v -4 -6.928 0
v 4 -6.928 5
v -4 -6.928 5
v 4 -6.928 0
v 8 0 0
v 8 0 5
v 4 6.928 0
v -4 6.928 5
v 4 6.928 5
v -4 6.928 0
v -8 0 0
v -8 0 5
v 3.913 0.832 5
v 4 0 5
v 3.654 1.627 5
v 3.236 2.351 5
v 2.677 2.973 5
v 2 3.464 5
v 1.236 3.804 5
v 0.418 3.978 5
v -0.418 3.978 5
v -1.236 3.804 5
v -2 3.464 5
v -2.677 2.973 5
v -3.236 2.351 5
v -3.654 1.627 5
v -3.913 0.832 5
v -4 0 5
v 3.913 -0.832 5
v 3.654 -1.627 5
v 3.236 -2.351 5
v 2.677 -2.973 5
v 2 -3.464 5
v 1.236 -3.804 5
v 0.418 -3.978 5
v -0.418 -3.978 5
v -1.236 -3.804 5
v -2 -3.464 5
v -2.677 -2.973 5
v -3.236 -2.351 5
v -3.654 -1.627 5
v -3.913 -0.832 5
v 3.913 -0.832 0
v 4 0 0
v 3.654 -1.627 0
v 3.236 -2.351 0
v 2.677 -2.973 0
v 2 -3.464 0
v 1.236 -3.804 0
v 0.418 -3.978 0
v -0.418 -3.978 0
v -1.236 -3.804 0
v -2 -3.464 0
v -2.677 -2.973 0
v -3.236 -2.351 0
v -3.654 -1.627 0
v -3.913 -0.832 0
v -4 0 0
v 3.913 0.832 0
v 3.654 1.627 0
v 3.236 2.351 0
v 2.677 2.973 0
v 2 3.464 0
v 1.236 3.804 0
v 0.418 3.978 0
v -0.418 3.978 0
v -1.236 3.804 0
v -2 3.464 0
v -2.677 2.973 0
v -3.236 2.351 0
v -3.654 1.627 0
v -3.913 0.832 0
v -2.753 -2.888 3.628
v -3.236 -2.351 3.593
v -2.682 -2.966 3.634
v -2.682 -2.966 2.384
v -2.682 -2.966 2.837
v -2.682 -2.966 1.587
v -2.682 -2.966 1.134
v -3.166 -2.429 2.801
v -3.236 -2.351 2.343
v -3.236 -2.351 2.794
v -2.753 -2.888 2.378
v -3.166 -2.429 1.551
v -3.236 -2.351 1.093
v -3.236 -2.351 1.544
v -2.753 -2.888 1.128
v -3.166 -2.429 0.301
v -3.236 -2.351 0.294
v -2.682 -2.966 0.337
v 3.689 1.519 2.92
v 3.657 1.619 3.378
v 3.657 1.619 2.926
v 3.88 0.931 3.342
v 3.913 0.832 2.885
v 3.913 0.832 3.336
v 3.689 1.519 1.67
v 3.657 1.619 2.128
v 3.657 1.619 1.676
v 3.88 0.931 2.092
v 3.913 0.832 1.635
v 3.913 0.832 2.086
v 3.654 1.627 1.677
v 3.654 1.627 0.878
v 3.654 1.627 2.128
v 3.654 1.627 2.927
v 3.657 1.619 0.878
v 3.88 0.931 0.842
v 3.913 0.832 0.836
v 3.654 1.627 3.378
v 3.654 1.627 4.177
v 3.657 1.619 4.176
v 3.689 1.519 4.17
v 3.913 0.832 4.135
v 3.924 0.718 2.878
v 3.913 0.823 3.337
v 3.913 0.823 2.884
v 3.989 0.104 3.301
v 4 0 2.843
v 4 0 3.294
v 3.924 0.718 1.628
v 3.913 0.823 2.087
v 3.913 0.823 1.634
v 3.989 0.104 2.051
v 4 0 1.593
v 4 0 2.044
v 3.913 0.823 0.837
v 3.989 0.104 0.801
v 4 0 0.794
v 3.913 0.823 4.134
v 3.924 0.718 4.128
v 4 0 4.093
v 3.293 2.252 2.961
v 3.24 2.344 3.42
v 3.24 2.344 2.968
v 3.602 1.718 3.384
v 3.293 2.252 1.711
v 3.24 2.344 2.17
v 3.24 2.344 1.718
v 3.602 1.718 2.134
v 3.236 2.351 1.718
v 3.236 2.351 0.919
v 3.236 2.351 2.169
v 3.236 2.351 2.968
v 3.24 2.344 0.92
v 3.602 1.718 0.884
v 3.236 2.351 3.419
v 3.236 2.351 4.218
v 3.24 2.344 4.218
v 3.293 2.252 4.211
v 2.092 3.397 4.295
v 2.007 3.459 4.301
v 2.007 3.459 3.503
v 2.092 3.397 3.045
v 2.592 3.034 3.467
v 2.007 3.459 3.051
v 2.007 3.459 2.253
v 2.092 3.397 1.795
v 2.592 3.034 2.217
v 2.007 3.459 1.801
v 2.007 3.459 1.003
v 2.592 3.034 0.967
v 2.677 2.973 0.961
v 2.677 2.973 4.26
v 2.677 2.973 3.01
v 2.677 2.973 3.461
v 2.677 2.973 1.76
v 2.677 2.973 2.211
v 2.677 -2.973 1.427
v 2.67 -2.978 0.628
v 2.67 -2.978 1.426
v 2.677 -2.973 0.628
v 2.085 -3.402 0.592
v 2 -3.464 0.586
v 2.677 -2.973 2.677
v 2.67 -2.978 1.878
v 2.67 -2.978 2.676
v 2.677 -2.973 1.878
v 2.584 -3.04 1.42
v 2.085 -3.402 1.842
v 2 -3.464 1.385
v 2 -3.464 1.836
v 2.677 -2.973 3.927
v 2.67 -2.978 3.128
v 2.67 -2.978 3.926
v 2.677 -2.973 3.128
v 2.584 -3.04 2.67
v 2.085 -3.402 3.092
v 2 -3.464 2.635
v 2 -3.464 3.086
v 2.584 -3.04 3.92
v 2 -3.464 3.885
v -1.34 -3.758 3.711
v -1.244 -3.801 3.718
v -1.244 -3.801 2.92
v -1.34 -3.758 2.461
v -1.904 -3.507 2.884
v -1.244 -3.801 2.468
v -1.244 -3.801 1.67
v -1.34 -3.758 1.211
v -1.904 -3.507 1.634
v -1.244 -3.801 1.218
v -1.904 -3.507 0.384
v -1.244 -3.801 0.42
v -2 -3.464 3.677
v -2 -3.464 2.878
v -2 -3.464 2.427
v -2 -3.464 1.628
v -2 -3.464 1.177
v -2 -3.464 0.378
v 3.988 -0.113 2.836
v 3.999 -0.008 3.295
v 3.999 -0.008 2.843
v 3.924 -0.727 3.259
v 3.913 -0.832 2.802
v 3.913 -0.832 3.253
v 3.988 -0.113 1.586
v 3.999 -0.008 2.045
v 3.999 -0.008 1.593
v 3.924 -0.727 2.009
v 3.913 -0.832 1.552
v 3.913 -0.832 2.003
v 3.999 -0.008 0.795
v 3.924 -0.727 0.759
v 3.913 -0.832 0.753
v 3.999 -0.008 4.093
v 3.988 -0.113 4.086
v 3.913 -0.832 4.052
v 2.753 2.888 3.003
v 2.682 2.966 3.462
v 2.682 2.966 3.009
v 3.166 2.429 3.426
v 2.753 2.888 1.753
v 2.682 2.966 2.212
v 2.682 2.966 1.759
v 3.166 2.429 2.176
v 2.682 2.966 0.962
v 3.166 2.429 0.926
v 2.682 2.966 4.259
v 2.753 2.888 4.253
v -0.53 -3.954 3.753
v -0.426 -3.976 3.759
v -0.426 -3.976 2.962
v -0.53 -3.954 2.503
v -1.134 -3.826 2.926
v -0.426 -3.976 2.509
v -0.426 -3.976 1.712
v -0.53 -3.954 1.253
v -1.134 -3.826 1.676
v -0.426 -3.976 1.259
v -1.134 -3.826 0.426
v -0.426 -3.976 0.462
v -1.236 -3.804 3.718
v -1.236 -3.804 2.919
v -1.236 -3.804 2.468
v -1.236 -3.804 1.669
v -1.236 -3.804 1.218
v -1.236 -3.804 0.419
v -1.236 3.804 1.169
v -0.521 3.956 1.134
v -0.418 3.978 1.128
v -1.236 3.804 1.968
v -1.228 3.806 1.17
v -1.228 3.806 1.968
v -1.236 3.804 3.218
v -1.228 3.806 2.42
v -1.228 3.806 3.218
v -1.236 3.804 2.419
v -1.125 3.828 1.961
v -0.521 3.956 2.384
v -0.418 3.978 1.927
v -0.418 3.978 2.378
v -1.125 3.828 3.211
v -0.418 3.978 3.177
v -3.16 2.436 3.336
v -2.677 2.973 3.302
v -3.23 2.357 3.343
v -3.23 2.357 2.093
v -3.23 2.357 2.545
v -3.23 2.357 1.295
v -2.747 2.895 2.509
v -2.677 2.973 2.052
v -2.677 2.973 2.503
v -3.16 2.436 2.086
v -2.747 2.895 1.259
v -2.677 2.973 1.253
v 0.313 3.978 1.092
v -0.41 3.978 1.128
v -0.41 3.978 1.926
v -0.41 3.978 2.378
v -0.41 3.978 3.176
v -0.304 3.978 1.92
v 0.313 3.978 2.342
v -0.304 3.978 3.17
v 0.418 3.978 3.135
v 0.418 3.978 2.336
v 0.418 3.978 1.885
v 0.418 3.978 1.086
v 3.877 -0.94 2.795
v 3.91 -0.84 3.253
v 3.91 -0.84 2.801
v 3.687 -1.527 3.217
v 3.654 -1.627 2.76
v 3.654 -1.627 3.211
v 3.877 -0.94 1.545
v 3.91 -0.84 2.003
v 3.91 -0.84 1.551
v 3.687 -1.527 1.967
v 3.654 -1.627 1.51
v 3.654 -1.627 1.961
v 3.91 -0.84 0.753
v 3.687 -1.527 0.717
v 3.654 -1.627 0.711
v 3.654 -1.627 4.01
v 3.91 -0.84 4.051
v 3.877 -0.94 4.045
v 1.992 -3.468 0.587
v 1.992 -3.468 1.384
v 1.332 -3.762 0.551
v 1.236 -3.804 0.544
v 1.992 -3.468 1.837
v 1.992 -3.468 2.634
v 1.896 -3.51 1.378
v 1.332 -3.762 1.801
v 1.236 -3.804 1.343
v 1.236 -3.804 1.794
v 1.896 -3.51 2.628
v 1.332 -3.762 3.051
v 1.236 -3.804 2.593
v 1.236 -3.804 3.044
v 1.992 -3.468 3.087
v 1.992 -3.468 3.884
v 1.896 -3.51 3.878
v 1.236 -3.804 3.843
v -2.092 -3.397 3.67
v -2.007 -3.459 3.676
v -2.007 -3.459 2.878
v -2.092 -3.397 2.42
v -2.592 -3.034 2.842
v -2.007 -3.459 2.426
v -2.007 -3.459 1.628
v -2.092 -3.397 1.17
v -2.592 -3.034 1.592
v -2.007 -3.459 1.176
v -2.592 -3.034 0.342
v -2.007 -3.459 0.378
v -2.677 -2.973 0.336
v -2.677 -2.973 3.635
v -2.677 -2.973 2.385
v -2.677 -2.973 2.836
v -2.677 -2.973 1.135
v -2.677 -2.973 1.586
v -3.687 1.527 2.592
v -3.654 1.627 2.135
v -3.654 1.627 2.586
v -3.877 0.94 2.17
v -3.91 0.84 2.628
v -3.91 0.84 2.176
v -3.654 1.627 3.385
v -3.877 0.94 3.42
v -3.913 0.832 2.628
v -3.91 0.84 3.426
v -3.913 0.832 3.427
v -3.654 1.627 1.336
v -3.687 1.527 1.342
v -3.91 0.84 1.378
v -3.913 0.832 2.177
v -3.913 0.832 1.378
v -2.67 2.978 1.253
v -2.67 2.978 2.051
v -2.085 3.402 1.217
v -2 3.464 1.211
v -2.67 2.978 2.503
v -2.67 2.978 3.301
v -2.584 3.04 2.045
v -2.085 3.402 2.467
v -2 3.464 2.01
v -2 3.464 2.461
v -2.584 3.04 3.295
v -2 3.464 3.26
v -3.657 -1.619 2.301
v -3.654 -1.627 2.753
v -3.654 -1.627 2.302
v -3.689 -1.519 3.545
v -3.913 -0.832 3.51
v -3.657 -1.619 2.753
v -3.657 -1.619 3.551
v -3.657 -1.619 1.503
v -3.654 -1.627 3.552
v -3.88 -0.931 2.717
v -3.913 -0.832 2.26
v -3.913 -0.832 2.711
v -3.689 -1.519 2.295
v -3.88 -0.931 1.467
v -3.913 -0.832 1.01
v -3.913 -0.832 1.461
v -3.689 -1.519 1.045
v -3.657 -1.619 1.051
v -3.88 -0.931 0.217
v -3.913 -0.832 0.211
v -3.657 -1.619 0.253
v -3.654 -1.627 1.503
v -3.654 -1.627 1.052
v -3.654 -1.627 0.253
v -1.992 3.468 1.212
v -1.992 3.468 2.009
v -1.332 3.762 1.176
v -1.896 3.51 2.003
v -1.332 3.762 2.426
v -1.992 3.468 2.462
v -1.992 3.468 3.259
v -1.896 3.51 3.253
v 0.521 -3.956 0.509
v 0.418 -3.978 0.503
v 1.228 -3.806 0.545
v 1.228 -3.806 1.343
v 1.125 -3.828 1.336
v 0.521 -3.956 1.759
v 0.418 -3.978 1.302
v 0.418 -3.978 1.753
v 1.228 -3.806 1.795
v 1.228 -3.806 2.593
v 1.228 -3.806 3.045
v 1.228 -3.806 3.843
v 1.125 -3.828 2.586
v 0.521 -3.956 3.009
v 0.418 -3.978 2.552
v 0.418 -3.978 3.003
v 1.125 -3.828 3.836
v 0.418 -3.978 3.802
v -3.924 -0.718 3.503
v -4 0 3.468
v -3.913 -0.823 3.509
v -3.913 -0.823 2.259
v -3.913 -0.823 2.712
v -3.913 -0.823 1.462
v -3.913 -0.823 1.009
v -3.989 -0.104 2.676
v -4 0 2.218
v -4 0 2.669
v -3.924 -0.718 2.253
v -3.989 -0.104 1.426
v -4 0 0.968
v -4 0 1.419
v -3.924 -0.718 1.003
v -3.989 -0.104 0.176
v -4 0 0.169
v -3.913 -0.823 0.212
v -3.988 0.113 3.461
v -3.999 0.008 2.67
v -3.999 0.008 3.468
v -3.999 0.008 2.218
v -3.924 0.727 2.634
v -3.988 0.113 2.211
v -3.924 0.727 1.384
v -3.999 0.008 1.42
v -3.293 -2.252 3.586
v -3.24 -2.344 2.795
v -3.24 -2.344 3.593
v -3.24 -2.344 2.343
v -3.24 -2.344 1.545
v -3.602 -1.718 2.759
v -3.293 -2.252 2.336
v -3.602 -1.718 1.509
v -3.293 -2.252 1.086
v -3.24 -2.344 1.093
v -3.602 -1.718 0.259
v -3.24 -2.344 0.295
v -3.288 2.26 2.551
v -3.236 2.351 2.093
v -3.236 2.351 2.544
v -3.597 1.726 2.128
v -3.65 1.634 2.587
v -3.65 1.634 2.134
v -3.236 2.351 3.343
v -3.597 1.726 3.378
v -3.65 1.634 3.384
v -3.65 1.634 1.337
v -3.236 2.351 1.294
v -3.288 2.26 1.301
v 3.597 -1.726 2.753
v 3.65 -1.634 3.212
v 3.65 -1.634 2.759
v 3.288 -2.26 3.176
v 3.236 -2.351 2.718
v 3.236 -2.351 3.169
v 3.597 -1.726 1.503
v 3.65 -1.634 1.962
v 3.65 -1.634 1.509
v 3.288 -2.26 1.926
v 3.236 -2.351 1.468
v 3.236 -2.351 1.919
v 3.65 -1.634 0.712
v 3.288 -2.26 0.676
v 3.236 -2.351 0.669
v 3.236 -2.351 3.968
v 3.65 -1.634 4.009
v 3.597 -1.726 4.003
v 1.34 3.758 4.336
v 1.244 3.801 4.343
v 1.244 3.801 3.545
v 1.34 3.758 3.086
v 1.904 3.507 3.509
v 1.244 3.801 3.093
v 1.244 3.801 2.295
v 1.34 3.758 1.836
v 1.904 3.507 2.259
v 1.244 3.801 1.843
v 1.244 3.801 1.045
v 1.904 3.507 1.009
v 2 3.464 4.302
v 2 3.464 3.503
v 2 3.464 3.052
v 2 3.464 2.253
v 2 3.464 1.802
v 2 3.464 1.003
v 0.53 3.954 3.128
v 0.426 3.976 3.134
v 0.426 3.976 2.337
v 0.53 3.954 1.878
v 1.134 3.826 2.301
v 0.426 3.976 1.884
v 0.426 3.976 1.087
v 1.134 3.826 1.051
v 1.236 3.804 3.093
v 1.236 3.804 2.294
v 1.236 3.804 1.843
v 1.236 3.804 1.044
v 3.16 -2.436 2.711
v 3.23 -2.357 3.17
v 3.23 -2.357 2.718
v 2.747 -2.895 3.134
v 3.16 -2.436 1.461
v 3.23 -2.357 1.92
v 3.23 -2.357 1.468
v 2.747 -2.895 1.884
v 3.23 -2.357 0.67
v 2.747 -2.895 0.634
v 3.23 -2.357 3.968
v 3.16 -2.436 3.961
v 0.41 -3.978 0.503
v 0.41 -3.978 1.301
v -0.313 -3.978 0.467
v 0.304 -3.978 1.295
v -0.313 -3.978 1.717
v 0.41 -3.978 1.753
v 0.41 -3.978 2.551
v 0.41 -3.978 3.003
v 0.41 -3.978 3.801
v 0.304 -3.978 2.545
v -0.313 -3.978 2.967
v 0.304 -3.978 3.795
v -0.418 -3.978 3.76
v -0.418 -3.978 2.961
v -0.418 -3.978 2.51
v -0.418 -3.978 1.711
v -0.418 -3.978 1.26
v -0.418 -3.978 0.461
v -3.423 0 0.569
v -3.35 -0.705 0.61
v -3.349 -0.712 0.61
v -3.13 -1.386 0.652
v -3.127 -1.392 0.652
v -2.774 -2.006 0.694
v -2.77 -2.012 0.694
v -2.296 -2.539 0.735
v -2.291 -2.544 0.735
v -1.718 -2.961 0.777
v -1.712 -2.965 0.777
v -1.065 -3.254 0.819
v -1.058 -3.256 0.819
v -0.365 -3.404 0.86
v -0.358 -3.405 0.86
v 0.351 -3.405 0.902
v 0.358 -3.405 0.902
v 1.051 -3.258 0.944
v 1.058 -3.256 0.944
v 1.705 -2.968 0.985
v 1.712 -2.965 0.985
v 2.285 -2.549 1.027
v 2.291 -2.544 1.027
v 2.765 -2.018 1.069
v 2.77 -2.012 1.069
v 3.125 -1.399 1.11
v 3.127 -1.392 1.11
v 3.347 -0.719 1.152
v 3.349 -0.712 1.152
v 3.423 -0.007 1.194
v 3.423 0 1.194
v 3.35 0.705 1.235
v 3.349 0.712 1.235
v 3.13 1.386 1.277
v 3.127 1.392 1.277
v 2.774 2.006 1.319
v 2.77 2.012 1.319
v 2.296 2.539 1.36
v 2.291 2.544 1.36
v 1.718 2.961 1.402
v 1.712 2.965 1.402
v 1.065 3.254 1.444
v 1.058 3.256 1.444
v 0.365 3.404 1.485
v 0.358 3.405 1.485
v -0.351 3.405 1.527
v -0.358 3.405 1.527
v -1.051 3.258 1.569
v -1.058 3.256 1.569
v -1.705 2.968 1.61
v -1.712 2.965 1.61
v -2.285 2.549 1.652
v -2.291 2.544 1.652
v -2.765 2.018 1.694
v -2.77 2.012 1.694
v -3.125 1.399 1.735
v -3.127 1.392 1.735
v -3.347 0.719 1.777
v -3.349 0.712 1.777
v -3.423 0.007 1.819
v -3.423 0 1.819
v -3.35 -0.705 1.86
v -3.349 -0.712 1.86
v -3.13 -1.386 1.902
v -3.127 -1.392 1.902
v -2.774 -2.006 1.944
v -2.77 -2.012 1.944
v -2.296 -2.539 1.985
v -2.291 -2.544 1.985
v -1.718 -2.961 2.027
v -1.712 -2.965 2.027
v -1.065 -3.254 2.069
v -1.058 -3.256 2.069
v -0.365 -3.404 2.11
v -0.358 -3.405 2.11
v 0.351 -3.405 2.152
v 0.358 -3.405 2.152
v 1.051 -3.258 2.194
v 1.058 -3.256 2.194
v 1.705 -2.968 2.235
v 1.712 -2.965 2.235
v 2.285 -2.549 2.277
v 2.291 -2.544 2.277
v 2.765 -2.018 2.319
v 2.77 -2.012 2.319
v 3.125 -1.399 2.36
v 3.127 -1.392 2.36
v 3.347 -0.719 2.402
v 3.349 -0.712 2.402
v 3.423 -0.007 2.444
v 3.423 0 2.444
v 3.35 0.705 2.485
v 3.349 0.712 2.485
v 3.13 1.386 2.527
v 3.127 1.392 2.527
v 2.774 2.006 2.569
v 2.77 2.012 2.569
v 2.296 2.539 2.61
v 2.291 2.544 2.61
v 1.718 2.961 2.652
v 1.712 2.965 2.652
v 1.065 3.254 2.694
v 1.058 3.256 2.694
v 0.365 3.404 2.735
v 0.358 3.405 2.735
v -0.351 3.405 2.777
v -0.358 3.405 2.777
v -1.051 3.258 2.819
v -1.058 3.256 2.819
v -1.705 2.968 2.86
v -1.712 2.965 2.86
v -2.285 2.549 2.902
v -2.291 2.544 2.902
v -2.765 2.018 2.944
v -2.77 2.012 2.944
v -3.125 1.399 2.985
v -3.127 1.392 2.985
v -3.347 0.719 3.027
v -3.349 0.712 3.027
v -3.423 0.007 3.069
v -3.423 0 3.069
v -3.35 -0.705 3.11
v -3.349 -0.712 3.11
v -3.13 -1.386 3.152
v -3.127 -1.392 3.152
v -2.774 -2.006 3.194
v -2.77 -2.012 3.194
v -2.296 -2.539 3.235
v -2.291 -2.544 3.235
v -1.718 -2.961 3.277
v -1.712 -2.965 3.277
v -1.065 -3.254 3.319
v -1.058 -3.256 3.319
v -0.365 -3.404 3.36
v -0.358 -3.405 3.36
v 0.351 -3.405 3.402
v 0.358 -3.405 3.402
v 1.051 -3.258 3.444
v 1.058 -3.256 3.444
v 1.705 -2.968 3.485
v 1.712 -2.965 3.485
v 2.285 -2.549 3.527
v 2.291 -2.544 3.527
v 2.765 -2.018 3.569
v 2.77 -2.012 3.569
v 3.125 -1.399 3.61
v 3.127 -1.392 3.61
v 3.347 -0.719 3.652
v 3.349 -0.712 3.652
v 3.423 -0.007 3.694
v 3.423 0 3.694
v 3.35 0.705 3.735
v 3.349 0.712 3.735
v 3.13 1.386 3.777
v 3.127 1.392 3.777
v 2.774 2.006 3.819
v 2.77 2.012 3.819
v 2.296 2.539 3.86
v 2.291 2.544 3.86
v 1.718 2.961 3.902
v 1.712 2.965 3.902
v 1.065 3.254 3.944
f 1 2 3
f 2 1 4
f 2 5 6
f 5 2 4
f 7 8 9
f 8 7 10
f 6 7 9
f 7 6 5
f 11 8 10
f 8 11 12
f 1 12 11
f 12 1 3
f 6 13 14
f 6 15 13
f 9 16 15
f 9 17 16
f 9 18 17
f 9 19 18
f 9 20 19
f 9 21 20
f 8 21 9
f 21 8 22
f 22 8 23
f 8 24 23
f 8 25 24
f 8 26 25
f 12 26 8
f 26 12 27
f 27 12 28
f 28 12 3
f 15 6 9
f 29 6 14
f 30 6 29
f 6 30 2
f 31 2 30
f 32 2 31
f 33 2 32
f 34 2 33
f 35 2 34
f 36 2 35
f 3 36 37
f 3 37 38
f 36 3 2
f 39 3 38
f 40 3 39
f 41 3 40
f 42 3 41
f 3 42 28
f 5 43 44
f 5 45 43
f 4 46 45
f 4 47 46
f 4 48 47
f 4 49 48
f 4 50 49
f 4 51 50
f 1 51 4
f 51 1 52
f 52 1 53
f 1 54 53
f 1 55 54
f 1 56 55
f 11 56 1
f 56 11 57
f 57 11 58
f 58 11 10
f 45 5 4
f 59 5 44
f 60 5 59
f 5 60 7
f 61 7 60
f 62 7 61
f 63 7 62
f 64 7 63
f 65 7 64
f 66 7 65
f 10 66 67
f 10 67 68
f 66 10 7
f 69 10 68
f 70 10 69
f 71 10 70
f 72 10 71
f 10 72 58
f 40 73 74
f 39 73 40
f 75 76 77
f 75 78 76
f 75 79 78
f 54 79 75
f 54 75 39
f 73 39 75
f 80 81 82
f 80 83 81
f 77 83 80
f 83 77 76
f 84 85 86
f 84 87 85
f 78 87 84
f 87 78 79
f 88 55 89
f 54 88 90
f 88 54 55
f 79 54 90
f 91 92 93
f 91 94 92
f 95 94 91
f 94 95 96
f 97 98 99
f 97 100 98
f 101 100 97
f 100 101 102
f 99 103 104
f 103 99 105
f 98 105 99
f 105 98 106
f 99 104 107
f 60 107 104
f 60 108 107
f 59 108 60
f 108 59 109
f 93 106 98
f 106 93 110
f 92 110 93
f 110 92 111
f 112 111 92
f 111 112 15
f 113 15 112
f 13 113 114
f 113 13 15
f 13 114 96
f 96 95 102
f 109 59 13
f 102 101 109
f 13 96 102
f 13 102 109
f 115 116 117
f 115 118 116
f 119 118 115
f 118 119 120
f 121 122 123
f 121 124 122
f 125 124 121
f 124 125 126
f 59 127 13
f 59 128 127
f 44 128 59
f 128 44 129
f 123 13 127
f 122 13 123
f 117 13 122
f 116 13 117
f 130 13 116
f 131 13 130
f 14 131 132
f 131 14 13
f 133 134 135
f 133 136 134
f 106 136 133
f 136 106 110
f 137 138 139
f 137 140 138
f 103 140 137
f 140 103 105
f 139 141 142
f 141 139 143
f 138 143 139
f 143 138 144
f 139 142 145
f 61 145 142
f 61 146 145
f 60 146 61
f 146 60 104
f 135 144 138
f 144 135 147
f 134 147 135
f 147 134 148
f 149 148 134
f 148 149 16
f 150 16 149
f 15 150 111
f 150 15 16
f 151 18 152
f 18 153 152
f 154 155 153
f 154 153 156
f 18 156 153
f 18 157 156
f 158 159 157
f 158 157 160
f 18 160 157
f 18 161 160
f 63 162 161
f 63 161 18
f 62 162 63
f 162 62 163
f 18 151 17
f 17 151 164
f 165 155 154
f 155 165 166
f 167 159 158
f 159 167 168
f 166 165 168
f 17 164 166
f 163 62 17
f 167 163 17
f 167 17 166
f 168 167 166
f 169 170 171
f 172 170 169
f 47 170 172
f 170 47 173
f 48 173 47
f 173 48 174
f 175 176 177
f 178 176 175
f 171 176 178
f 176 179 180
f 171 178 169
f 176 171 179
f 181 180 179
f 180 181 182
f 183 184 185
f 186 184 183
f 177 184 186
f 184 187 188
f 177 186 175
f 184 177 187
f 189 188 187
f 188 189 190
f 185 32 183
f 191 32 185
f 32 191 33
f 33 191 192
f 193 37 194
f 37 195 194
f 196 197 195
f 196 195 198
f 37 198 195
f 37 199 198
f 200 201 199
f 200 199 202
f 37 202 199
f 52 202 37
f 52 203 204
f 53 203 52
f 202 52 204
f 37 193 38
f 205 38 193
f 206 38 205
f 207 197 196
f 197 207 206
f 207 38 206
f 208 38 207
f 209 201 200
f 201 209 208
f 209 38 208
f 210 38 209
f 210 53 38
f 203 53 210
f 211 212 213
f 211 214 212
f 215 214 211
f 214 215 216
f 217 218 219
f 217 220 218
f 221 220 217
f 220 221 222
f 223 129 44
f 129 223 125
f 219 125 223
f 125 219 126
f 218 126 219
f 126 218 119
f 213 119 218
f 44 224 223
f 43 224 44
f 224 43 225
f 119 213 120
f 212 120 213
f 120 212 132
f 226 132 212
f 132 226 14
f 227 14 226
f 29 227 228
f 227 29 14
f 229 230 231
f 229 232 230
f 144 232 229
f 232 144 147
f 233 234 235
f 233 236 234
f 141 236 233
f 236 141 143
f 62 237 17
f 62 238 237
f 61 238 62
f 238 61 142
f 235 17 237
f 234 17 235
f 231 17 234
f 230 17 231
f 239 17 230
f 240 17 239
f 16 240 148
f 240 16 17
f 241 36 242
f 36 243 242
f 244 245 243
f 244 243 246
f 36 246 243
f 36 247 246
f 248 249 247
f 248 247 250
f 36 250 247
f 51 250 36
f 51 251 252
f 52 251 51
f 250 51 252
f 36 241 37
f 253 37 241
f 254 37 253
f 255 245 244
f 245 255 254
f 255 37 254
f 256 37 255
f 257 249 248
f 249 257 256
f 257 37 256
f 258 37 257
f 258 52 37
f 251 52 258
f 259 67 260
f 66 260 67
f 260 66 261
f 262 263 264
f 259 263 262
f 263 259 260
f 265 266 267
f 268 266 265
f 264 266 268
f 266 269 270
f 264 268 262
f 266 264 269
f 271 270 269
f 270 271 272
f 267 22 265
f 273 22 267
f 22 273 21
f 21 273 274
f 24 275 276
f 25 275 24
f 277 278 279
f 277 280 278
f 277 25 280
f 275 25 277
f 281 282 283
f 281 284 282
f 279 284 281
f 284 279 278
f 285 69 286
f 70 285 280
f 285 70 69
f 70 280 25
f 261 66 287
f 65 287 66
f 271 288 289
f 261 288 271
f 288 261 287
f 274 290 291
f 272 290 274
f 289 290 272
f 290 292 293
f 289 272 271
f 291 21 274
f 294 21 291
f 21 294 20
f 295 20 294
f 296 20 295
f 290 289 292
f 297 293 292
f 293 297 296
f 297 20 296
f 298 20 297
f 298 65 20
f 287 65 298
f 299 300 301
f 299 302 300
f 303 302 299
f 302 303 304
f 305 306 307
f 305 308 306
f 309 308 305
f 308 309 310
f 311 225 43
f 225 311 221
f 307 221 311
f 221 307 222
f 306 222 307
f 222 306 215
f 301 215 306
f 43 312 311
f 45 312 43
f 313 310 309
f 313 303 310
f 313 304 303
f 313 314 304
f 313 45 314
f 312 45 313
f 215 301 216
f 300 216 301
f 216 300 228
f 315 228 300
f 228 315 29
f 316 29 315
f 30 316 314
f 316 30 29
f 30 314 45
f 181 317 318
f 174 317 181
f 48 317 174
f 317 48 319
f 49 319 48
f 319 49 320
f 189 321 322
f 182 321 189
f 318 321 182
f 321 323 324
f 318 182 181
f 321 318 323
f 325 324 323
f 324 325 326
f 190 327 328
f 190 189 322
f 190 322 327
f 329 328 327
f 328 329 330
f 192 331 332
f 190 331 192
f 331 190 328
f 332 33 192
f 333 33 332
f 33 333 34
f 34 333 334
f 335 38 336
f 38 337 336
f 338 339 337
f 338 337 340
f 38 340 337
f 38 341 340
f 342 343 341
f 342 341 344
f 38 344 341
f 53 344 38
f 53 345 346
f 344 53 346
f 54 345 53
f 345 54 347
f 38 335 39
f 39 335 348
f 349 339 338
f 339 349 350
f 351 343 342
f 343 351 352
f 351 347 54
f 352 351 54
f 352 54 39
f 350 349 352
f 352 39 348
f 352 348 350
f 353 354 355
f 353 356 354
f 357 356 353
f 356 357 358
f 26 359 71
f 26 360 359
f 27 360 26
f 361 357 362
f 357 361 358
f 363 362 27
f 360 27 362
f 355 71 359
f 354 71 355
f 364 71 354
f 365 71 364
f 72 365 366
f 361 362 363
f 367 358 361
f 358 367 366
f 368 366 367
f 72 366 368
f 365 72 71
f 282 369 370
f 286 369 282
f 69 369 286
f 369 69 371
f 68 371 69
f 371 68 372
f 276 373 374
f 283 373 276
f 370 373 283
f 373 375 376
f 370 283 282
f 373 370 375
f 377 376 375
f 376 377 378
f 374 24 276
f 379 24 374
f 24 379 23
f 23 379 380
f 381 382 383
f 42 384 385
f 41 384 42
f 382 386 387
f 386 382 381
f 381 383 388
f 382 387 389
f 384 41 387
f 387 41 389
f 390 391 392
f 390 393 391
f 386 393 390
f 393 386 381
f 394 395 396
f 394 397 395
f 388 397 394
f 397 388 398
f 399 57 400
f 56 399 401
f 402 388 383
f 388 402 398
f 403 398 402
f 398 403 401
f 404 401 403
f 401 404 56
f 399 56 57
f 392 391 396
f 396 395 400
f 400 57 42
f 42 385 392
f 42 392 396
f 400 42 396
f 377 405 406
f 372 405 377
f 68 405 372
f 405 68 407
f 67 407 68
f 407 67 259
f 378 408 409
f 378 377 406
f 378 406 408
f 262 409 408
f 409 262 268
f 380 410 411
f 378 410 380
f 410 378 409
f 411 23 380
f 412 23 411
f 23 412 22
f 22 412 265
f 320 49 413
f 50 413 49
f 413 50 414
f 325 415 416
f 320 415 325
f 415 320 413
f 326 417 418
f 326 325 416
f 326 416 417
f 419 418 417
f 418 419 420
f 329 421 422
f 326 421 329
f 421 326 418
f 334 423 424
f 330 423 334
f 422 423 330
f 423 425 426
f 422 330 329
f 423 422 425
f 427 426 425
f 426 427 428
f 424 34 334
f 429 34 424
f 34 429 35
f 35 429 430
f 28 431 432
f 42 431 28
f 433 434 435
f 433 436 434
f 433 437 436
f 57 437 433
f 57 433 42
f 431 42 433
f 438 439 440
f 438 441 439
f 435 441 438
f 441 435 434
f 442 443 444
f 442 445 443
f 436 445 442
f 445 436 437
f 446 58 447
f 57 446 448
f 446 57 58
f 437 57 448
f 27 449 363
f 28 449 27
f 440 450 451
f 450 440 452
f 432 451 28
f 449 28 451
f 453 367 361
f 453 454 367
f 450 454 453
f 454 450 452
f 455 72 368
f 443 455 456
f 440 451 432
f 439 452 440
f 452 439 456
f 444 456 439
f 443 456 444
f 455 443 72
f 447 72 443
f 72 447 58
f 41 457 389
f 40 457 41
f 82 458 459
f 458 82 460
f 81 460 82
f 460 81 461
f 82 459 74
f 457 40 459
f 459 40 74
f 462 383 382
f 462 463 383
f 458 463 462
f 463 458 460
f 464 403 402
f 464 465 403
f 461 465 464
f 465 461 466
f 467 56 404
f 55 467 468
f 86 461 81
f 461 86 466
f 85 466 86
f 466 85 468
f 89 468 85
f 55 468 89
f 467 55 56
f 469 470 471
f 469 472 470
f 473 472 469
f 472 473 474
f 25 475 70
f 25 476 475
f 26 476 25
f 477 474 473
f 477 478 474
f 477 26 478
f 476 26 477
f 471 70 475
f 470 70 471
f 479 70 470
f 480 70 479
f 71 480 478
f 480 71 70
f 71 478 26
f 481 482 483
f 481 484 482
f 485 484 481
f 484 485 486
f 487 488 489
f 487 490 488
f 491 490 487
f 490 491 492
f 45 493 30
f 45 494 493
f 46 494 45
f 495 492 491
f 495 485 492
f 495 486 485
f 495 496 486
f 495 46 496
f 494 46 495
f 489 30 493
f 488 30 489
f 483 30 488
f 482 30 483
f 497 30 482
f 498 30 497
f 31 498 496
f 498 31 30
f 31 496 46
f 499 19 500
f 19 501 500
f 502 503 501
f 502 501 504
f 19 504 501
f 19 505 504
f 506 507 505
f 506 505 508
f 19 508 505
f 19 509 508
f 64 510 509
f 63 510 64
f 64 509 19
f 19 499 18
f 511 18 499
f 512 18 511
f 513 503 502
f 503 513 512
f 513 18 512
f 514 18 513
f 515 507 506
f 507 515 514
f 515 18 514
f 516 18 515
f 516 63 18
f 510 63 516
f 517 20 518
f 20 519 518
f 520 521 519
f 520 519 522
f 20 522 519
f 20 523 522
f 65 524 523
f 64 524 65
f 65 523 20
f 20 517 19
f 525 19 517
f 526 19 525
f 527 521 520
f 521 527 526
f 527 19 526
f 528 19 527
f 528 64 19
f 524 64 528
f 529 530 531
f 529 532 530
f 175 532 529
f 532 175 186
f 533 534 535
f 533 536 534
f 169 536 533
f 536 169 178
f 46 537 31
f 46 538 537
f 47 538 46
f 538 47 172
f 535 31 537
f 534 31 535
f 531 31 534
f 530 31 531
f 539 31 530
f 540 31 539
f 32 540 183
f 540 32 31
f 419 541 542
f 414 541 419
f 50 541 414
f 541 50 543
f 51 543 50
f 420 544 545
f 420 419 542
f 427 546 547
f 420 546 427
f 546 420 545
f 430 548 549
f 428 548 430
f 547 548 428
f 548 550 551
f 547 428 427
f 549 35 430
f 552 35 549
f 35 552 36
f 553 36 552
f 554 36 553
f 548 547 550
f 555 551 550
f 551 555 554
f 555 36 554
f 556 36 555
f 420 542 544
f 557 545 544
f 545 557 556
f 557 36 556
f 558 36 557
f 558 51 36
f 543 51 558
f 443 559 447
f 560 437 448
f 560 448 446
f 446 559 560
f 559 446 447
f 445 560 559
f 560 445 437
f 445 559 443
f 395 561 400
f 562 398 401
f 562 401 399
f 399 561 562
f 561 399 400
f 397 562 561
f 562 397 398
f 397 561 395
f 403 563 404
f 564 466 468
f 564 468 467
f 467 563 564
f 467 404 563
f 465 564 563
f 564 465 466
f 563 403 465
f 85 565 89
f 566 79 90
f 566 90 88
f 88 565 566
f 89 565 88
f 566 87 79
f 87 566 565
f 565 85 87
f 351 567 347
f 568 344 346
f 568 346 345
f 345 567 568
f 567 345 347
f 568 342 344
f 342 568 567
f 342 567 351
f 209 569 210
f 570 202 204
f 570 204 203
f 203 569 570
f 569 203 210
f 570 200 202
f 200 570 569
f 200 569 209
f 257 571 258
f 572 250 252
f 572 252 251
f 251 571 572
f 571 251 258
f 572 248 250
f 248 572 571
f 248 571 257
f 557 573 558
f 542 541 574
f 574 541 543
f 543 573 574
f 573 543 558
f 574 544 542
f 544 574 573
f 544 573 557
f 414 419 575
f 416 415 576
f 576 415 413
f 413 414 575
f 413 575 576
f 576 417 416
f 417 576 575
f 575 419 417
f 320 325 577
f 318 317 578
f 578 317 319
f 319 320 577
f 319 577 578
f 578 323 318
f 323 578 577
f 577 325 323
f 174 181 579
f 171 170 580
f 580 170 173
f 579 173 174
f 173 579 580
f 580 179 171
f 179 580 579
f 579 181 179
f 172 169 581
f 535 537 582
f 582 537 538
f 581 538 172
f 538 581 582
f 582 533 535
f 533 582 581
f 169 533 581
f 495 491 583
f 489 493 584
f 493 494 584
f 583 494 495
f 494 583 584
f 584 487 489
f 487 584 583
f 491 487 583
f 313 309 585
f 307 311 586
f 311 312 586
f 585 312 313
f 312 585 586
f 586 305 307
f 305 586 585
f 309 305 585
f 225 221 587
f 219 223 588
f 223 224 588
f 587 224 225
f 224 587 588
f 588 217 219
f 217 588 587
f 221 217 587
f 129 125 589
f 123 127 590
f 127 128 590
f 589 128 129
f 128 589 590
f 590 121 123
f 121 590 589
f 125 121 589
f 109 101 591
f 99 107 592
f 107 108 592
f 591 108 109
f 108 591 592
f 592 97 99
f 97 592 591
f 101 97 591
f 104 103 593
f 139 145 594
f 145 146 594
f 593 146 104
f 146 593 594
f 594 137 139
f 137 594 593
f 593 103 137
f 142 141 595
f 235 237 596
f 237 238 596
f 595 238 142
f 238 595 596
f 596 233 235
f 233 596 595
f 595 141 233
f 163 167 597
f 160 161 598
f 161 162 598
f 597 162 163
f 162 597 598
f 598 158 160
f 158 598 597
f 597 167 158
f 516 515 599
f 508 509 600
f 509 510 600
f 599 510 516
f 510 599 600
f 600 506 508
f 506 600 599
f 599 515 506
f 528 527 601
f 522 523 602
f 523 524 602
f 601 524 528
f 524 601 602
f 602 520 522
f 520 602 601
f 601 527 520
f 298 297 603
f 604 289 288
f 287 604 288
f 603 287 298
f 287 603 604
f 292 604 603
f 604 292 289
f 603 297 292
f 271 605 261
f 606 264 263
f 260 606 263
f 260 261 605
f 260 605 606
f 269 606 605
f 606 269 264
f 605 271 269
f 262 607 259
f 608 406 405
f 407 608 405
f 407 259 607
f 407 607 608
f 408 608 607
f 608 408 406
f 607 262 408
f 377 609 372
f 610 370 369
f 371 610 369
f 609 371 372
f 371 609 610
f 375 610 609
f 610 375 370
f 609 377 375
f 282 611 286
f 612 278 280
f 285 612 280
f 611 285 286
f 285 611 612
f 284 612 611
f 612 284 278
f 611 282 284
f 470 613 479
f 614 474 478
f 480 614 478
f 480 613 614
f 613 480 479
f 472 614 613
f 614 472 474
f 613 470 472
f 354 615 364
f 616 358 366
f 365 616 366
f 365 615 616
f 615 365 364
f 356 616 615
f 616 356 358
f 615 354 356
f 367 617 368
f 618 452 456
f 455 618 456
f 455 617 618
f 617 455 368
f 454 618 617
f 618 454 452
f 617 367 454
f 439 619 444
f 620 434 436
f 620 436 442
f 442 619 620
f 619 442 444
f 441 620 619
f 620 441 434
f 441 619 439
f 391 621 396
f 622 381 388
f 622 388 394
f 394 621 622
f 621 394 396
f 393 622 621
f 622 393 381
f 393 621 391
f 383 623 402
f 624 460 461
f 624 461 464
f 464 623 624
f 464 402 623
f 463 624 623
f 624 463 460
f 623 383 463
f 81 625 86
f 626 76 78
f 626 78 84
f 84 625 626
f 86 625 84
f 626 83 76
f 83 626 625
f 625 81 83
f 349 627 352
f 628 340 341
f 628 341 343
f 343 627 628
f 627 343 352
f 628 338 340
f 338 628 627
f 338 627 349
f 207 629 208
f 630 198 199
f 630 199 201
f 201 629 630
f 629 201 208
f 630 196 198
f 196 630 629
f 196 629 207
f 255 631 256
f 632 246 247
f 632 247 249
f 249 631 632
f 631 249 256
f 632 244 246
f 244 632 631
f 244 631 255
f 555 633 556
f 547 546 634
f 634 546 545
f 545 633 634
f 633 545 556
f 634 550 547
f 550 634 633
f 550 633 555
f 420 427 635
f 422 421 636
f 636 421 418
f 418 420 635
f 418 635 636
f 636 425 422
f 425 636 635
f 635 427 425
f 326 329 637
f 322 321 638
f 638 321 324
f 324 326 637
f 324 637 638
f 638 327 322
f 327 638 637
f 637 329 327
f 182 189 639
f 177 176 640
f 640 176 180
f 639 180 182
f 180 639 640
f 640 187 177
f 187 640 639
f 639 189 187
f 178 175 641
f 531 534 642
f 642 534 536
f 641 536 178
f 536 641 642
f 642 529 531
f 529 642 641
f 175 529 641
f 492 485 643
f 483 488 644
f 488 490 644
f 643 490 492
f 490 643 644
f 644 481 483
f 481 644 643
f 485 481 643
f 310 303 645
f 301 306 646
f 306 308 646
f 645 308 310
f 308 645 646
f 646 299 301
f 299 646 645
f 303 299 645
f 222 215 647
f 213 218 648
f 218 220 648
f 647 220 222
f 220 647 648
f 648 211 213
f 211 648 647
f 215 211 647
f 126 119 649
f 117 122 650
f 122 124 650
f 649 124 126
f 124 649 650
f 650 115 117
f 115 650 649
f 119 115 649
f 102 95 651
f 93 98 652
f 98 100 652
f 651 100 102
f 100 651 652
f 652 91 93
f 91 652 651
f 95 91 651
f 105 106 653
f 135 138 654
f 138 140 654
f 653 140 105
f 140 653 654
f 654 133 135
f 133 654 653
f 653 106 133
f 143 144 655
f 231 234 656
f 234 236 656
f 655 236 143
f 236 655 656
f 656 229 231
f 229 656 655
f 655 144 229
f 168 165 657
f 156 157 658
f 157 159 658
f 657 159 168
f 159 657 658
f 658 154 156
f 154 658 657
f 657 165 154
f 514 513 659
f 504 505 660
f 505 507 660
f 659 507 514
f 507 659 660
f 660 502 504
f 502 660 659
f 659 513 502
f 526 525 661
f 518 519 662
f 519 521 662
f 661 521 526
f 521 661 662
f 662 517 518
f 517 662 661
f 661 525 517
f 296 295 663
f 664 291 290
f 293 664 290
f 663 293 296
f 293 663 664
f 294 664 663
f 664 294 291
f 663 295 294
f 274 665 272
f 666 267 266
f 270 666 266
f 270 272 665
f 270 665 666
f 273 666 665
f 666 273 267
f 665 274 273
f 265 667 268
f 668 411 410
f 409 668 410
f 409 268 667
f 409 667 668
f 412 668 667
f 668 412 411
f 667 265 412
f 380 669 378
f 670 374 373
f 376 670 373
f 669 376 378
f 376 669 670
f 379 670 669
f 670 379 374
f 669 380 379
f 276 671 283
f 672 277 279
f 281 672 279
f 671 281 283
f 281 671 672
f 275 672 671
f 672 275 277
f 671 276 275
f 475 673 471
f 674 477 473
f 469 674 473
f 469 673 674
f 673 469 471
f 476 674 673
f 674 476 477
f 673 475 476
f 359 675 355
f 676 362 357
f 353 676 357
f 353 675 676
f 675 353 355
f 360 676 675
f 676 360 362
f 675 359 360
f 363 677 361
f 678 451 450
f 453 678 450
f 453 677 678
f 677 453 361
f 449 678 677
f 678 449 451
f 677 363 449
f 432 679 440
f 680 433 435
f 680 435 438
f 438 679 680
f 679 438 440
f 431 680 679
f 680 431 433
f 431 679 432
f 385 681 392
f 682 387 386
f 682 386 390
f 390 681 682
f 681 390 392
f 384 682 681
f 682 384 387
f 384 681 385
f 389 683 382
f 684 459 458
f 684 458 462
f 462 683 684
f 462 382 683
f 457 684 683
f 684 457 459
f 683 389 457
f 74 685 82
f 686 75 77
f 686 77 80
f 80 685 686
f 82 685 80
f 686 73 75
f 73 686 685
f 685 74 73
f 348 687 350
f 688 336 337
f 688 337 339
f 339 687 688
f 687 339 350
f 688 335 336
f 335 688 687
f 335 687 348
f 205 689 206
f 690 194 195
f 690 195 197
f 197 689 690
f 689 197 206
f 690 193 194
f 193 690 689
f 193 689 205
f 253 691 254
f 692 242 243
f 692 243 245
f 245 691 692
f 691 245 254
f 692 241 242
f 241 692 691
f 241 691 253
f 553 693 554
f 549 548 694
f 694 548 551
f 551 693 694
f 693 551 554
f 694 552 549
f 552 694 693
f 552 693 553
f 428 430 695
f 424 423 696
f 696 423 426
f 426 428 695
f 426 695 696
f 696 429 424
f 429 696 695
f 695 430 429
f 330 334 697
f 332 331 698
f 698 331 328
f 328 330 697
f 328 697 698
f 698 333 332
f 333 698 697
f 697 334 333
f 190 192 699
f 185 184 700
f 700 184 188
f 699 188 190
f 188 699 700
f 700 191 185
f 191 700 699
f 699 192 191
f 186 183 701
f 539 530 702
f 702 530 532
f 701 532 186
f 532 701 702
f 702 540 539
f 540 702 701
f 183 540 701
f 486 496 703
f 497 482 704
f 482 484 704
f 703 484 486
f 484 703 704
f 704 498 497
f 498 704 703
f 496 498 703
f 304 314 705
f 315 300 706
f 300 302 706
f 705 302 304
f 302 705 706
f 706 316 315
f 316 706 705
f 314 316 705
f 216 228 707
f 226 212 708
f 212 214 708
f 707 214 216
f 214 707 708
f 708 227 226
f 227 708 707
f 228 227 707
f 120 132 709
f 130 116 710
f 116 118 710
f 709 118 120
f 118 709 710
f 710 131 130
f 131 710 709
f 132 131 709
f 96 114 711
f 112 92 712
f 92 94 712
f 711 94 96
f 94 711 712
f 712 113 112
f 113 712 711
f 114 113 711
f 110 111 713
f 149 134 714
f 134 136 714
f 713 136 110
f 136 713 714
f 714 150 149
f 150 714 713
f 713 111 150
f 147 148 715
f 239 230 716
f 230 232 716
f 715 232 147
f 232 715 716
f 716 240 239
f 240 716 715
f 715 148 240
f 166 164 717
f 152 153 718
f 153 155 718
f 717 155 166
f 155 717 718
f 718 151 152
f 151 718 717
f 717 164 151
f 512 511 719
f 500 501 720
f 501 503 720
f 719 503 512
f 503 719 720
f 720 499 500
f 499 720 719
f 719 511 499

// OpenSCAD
// ISO Metric Thread Implementation
// Trevor Moseley
// 26/04/2014

// For thread dimensions see
//   http://en.wikipedia.org/wiki/File:ISO_and_UTS_Thread_Dimensions.svg

/* [Global] */

// What quality?
$fn = 30;	// [20,30,40,50,60,70,80,90,100]

// What Wrench (Spanner) sizes?
WrenchSizes = 0;	// [0:Rolson sizes,1:Fairbury sizes]

// Nuts or Bolts?
Type = 0;	// [0:Nuts,1:Bolts]

// What size of metric thread?
Thread = 8;	//[5:100]

// What length of thread (mm)?
Length = 16;	//[5:100]

// How many accross (y)?
Accros = 1;	// [1:20]

// How many down (x)?
Down = 1;	// [1:20]

// Spacing between centres?
Space = 17;	// [5:200]

do_it();

module do_it()
{
	for (ac=[1:Accros])
	{
		for (dn=[1:Down])
		{
			translate([
				-(((Accros-1)*Space)/2)+((ac-1)*Space),
				-(((Down-1)*Space)/2)+((dn-1)*Space),
				0])
			{
				if (Type==0)
					hex_nut(Thread);
				else
					hex_bolt(Thread,Length);
			}
		}
	}
}

//--demo functions--------------------------------------------------------------

//hex_bolt(10,16);						// make an M10 x 16 ISO bolt
//hex_nut(10);							// make an M10 ISO nut
//hex_bolt(8,16);						// make an M8 x 16 ISO bolt
//hex_nut(8);							// make an M8 ISO nut
//hex_bolt(6,12);						// make an M6 x 12 ISO bolt
//hex_nut(6);							// make an M6 ISO nut
//thread_out(8,16);					// make an M8 x 16 ISO thread
//thread_out_centre(8,16);				// make a centre for an M8 x 16 ISO thread
//thread_out_pitch(8,16,1.0);			// make an M8 x 16 thread with 1 mm pitch
//thread_out_centre_pitch(8,16,0.5);	// make the centre for an M8 x 16 thread with 1 mm pitch
//thread_in(8,10);						// make an M8 x 10 ISO thread
//thread_in_ring(8,10,2);				// make a ring to enclose an M8 x 10 ISO thread with thickness 2 mm
//thread_in_pitch(8,10,1.0);			// make an M8 x 10 thread with 1mm pitch

//--pitch-----------------------------------------------------------------------
// function for ISO coarse thread pitch (these are specified by ISO)
function get_coarse_pitch(dia) = lookup(dia, [
[1,0.25],[1.2,0.25],[1.4,0.3],[1.6,0.35],[1.8,0.35],[2,0.4],[2.5,0.45],[3,0.5],[3.5,0.6],[4,0.7],[5,0.8],[6,1],[7,1],[8,1.25],[10,1.5],[12,1.75],[14,2],[16,2],[18,2.5],[20,2.5],[22,2.5],[24,3],[27,3],[30,3.5],[33,3.5],[36,4],[39,4],[42,4.5],[45,4.5],[48,5],[52,5],[56,5.5],[60,5.5],[64,6],[78,5]]);

//--nut dims--------------------------------------------------------------------
// these are NOT specified by ISO
// support is provided for Rolson or Fairbury sizes, see WrenchSizes above

// function for Rolson hex nut diameter from thread size
function rolson_hex_nut_dia(dia) = lookup(dia, [
[3,6.4],[4,8.1],[5,9.2],[6,11.5],[8,16.0],[10,19.6],[12,22.1],[16,27.7],[20,34.6],[24,41.6],[30,53.1],[36,63.5]]);
// function for Rolson hex nut height from thread size
function rolson_hex_nut_hi(dia) = lookup(dia, [
[3,2.4],[4,3.2],[5,4],[6,3],[8,5],[10,5],[12,10],[16,13],[20,16],[24,19],[30,24],[36,29]]);

// function for Fairbury hex nut diameter from thread size
function fairbury_hex_nut_dia(dia) = lookup(dia, [
[3,6.0],[4,7.7],[5,8.8],[6,11.0],[8,14.4],[10,17.8],[12,20.0],[16,26.8],[20,33.0],[24,40.0],[30,50.9],[36,60.8]]);
// function for Fairbury hex nut height from thread size
function fairbury_hex_nut_hi(dia) = lookup(dia, [
[3,2.2],[4,3.0],[5,4.5],[6,5.0],[8,6.5],[10,8.1],[12,10.4],[16,14.2],[20,17],[24,20.3],[30,24.4],[36,29.5]]);

//--bolt dims-------------------------------------------------------------------
// these are NOT specified by ISO
// support is provided for Rolson or Fairbury sizes, see WrenchSizes above

// function for Rolson hex bolt head diameter from thread size
function rolson_hex_bolt_dia(dia) = lookup(dia, [
[3,6.4],[4,8.1],[5,9.2],[6,11.5],[8,14.0],[10,16],[12,22.1],[16,27.7],[20,34.6],[24,41.6],[30,53.1],[36,63.5]]);
// function for Rolson hex bolt head height from thread size
function rolson_hex_bolt_hi(dia) = lookup(dia, [
[3,2.4],[4,3.2],[5,4],[6,3.5],[8,4.5],[10,5],[12,10],[16,13],[20,16],[24,19],[30,24],[36,29]]);

// function for Fairbury hex bolt head diameter from thread size
function fairbury_hex_bolt_dia(dia) = lookup(dia, [
[3,6.4],[4,8.1],[5,8.8],[6,11.1],[8,14.4],[10,17.8],[12,20.1],[16,26.8],[20,33.0],[24,39.6],[30,50.9],[36,60.8]]);
// function for Fairbury hex bolt head height from thread size
function fairbury_hex_bolt_hi(dia) = lookup(dia, [
[3,2.4],[4,3.2],[5,3.4],[6,3.9],[8,5.1],[10,6.2],[12,7.3],[16,9.7],[20,12.2],[24,14.6],[30,17.9],[36,21.7]]);

//--top level modules-----------------------------------------------------------

module hex_bolt(dia,hi)
// make an ISO bolt
//  dia=diameter, 6=M6 etc.
//  hi=length of threaded part of bolt
{
	if (WrenchSizes==0)	rolson_hex_bolt(dia,hi);
	else					fairbury_hex_bolt(dia,hi);
}

module hex_nut(dia,hi)
// make an ISO nut
//  dia=diameter, 6=M6 etc.
{
	if (WrenchSizes==0)	rolson_hex_nut(dia);
	else					fairbury_hex_nut(dia);
}

module thread_out(dia,hi,thr=$fn)
// make an outside ISO thread (as used on a bolt)
//  dia=diameter, 6=M6 etc
//  hi=height, 10=make a 10mm long thread
//  thr=thread quality, 10=make a thread with 10 segments per turn
{
	p = get_coarse_pitch(dia);
	thread_out_pitch(dia,hi,p,thr);
}

module thread_in(dia,hi,thr=$fn)
// make an inside thread (as used on a nut)
//  dia = diameter, 6=M6 etc
//  hi = height, 10=make a 10mm long thread
//  thr = thread quality, 10=make a thread with 10 segments per turn
{
	p = get_coarse_pitch(dia);
	thread_in_pitch(dia,hi,p,thr);
}

module thread_out_pitch(dia,hi,p,thr=$fn)
// make an outside thread (as used on a bolt) with supplied pitch
//  dia=diameter, 6=M6 etc
//  hi=height, 10=make a 10mm long thread
//  p=pitch
//  thr=thread quality, 10=make a thread with 10 segments per turn
{
	h=(cos(30)*p)/8;
	Rmin=(dia/2)-(5*h);	// as wiki Dmin
	s=360/thr;				// length of segment in degrees
	t1=(hi-p)/p;			// number of full turns
	r=t1%1.0;				// length remaining (not full turn)
	t=t1-r;					// integer number of full turns
	n=r/(p/thr);			// number of segments for remainder
	// do full turns
	for(tn=[0:t-1])
		translate([0,0,tn*p])	th_out_turn(dia,p,thr);
	// do remainder
	for(sg=[0:n])
		th_out_pt(Rmin+0.1,p,s,sg+(t*thr),thr,h,p/thr);
}

module thread_in_pitch(dia,hi,p,thr=$fn)
// make an inside thread (as used on a nut)
//  dia = diameter, 6=M6 etc
//  hi = height, 10=make a 10mm long thread
//  p=pitch
//  thr = thread quality, 10=make a thread with 10 segments per turn
{
	h=(cos(30)*p)/8;
	Rmin=(dia/2)-(5*h);	// as wiki Dmin
	s=360/thr;				// length of segment in degrees
	t1=(hi-p)/p;			// number of full turns
	r=t1%1.0;				// length remaining (not full turn)
	t=t1-r;					// integer number of turns
	n=r/(p/thr);			// number of segments for remainder
	for(tn=[0:t-1])
		translate([0,0,tn*p])	th_in_turn(dia,p,thr);
	for(sg=[0:n])
		th_in_pt(Rmin+0.1,p,s,sg+(t*thr),thr,h,p/thr);
}

module thread_out_centre(dia,hi)
{
	p = get_coarse_pitch(dia);
	thread_out_centre_pitch(dia,hi,p);
}

module thread_out_centre_pitch(dia,hi,p)
{
	h = (cos(30)*p)/8;
	Rmin = (dia/2) - (5*h);	// as wiki Dmin
	cylinder(r = Rmin, h = hi);
}

module thread_in_ring(dia,hi,thk)
{
	difference()
	{
		cylinder(r = (dia/2)+0.5,h = hi);
		translate([0,0,-1]) cylinder(r = (dia/2)+0.1, h = hi+thk);
	}
}

//--low level modules-----------------------------------------------------------

module rolson_hex_bolt(dia,hi)
// make an ISO bolt with Rolson wrench sizes
//  dia=diameter, 6=M6 etc.
//  hi=length of threaded part of bolt
{
	hhi = rolson_hex_bolt_hi(dia);
	cylinder(r = rolson_hex_bolt_dia(dia)/2,h = hhi, $fn=6);
	translate([0,0,hhi-0.1])	thread_out(dia,hi+0.1);
	translate([0,0,hhi-0.1])	thread_out_centre(dia,hi+0.1);
}

module fairbury_hex_bolt(dia,hi)
// make an ISO bolt with Fairbury wrench sizes
//  dia=diameter, 6=M6 etc.
//  hi=length of threaded part of bolt
{
	hhi = fairbury_hex_bolt_hi(dia);
	cylinder(r = fairbury_hex_bolt_dia(dia)/2,h = hhi, $fn=6);
	translate([0,0,hhi-0.1])	thread_out(dia,hi+0.1);
	translate([0,0,hhi-0.1])	thread_out_centre(dia,hi+0.1);
}

module rolson_hex_nut(dia)
// make an ISO nut with Rolson wrench sizes
//  dia=diameter, 6=M6 etc.
{
	hi = rolson_hex_nut_hi(dia);
	difference()
	{
		cylinder(r = rolson_hex_nut_dia(dia)/2,h = hi, $fn=6);
		translate([0,0,-0.1])	cylinder(r = dia/2, h =hi + 0.2);
	}
	translate([0,0,0.1])	thread_in(dia,hi-0.2);
}

module fairbury_hex_nut(dia)
// make an ISO nut with Fairbury wrench sizes
//  dia=diameter, 6=M6 etc.
{
	hi = fairbury_hex_nut_hi(dia);
	difference()
	{
		cylinder(r = fairbury_hex_nut_dia(dia)/2,h = hi, $fn=6);
		translate([0,0,-0.1])	cylinder(r = dia/2, h =hi + 0.2);
	}
	translate([0,0,0.1])	thread_in(dia,hi-0.2);
}

module th_out_turn(dia,p,thr=$fn)
// make a single turn of an outside thread
//  dia=diameter, 6=M6 etc
//  p=pitch
//  thr=thread quality, 10=make a thread with 10 segments per turn
{
	h = (cos(30)*p)/8;
	Rmin = (dia/2) - (5*h);	// as wiki Dmin
	s = 360/thr;
	for(sg=[0:thr-1])
		th_out_pt(Rmin+0.1,p,s,sg,thr,h,p/thr);
}

module th_out_pt(rt,p,s,sg,thr,h,sh)
// make a part of an outside thread (single segment)
//  rt = radius of thread (nearest centre)
//  p = pitch
//  s = segment length (degrees)
//  sg = segment number
//  thr = segments in circumference
//  h = ISO h of thread / 8
//  sh = segment height (z)
{
	as = (sg % thr) * s;			// angle to start of seg
	ae = as + s  - (s/100);		// angle to end of seg (with overlap)
	z = sh*sg;
	//pp = p/2;
	//   1,4
	//   |\
	//   | \  2,5
 	//   | / 
	//   |/
	//   0,3
	//  view from front (x & z) extruded in y by sg
	//  
	//echo(str("as=",as,", ae=",ae," z=",z));
	polyhedron(
		points = [
			[cos(as)*rt,sin(as)*rt,z],								// 0
			[cos(as)*rt,sin(as)*rt,z+(3/4*p)],						// 1
			[cos(as)*(rt+(5*h)),sin(as)*(rt+(5*h)),z+(3/8*p)],		// 2
			[cos(ae)*rt,sin(ae)*rt,z+sh],							// 3
			[cos(ae)*rt,sin(ae)*rt,z+(3/4*p)+sh],					// 4
			[cos(ae)*(rt+(5*h)),sin(ae)*(rt+(5*h)),z+sh+(3/8*p)]],	// 5
		triangles = [
			[0,1,2],			// near face
			[3,5,4],			// far face
			[0,3,4],[0,4,1],	// left face
			[0,5,3],[0,2,5],	// bottom face
			[1,4,5],[1,5,2]]);	// top face
}

module th_in_turn(dia,p,thr=$fn)
// make an single turn of an inside thread
//  dia = diameter, 6=M6 etc
//  p=pitch
//  thr = thread quality, 10=make a thread with 10 segments per turn
{
	h = (cos(30)*p)/8;
	Rmin = (dia/2) - (5*h);	// as wiki Dmin
	s = 360/thr;
	for(sg=[0:thr-1])
		th_in_pt(Rmin+0.1,p,s,sg,thr,h,p/thr);
}

module th_in_pt(rt,p,s,sg,thr,h,sh)
// make a part of an inside thread (single segment)
//  rt = radius of thread (nearest centre)
//  p = pitch
//  s = segment length (degrees)
//  sg = segment number
//  thr = segments in circumference
//  h = ISO h of thread / 8
//  sh = segment height (z)
{
	as = ((sg % thr) * s - 180);	// angle to start of seg
	ae = as + s -(s/100);		// angle to end of seg (with overlap)
	z = sh*sg;
	pp = p/2;
	//         2,5
	//          /|
	//     1,4 / | 
 	//         \ |
	//          \|
	//         0,3
	//  view from front (x & z) extruded in y by sg
	//  
	polyhedron(
		points = [
			[cos(as)*(rt+(5*h)),sin(as)*(rt+(5*h)),z],				//0
			[cos(as)*rt,sin(as)*rt,z+(3/8*p)],						//1
			[cos(as)*(rt+(5*h)),sin(as)*(rt+(5*h)),z+(3/4*p)],		//2
			[cos(ae)*(rt+(5*h)),sin(ae)*(rt+(5*h)),z+sh],			//3
			[cos(ae)*rt,sin(ae)*rt,z+(3/8*p)+sh],					//4
			[cos(ae)*(rt+(5*h)),sin(ae)*(rt+(5*h)),z+(3/4*p)+sh]],	//5
		triangles = [
			[0,1,2],			// near face
			[3,5,4],			// far face
			[0,3,4],[0,4,1],	// left face
			[0,5,3],[0,2,5],	// bottom face
			[1,4,5],[1,5,2]]);	// top face
}
